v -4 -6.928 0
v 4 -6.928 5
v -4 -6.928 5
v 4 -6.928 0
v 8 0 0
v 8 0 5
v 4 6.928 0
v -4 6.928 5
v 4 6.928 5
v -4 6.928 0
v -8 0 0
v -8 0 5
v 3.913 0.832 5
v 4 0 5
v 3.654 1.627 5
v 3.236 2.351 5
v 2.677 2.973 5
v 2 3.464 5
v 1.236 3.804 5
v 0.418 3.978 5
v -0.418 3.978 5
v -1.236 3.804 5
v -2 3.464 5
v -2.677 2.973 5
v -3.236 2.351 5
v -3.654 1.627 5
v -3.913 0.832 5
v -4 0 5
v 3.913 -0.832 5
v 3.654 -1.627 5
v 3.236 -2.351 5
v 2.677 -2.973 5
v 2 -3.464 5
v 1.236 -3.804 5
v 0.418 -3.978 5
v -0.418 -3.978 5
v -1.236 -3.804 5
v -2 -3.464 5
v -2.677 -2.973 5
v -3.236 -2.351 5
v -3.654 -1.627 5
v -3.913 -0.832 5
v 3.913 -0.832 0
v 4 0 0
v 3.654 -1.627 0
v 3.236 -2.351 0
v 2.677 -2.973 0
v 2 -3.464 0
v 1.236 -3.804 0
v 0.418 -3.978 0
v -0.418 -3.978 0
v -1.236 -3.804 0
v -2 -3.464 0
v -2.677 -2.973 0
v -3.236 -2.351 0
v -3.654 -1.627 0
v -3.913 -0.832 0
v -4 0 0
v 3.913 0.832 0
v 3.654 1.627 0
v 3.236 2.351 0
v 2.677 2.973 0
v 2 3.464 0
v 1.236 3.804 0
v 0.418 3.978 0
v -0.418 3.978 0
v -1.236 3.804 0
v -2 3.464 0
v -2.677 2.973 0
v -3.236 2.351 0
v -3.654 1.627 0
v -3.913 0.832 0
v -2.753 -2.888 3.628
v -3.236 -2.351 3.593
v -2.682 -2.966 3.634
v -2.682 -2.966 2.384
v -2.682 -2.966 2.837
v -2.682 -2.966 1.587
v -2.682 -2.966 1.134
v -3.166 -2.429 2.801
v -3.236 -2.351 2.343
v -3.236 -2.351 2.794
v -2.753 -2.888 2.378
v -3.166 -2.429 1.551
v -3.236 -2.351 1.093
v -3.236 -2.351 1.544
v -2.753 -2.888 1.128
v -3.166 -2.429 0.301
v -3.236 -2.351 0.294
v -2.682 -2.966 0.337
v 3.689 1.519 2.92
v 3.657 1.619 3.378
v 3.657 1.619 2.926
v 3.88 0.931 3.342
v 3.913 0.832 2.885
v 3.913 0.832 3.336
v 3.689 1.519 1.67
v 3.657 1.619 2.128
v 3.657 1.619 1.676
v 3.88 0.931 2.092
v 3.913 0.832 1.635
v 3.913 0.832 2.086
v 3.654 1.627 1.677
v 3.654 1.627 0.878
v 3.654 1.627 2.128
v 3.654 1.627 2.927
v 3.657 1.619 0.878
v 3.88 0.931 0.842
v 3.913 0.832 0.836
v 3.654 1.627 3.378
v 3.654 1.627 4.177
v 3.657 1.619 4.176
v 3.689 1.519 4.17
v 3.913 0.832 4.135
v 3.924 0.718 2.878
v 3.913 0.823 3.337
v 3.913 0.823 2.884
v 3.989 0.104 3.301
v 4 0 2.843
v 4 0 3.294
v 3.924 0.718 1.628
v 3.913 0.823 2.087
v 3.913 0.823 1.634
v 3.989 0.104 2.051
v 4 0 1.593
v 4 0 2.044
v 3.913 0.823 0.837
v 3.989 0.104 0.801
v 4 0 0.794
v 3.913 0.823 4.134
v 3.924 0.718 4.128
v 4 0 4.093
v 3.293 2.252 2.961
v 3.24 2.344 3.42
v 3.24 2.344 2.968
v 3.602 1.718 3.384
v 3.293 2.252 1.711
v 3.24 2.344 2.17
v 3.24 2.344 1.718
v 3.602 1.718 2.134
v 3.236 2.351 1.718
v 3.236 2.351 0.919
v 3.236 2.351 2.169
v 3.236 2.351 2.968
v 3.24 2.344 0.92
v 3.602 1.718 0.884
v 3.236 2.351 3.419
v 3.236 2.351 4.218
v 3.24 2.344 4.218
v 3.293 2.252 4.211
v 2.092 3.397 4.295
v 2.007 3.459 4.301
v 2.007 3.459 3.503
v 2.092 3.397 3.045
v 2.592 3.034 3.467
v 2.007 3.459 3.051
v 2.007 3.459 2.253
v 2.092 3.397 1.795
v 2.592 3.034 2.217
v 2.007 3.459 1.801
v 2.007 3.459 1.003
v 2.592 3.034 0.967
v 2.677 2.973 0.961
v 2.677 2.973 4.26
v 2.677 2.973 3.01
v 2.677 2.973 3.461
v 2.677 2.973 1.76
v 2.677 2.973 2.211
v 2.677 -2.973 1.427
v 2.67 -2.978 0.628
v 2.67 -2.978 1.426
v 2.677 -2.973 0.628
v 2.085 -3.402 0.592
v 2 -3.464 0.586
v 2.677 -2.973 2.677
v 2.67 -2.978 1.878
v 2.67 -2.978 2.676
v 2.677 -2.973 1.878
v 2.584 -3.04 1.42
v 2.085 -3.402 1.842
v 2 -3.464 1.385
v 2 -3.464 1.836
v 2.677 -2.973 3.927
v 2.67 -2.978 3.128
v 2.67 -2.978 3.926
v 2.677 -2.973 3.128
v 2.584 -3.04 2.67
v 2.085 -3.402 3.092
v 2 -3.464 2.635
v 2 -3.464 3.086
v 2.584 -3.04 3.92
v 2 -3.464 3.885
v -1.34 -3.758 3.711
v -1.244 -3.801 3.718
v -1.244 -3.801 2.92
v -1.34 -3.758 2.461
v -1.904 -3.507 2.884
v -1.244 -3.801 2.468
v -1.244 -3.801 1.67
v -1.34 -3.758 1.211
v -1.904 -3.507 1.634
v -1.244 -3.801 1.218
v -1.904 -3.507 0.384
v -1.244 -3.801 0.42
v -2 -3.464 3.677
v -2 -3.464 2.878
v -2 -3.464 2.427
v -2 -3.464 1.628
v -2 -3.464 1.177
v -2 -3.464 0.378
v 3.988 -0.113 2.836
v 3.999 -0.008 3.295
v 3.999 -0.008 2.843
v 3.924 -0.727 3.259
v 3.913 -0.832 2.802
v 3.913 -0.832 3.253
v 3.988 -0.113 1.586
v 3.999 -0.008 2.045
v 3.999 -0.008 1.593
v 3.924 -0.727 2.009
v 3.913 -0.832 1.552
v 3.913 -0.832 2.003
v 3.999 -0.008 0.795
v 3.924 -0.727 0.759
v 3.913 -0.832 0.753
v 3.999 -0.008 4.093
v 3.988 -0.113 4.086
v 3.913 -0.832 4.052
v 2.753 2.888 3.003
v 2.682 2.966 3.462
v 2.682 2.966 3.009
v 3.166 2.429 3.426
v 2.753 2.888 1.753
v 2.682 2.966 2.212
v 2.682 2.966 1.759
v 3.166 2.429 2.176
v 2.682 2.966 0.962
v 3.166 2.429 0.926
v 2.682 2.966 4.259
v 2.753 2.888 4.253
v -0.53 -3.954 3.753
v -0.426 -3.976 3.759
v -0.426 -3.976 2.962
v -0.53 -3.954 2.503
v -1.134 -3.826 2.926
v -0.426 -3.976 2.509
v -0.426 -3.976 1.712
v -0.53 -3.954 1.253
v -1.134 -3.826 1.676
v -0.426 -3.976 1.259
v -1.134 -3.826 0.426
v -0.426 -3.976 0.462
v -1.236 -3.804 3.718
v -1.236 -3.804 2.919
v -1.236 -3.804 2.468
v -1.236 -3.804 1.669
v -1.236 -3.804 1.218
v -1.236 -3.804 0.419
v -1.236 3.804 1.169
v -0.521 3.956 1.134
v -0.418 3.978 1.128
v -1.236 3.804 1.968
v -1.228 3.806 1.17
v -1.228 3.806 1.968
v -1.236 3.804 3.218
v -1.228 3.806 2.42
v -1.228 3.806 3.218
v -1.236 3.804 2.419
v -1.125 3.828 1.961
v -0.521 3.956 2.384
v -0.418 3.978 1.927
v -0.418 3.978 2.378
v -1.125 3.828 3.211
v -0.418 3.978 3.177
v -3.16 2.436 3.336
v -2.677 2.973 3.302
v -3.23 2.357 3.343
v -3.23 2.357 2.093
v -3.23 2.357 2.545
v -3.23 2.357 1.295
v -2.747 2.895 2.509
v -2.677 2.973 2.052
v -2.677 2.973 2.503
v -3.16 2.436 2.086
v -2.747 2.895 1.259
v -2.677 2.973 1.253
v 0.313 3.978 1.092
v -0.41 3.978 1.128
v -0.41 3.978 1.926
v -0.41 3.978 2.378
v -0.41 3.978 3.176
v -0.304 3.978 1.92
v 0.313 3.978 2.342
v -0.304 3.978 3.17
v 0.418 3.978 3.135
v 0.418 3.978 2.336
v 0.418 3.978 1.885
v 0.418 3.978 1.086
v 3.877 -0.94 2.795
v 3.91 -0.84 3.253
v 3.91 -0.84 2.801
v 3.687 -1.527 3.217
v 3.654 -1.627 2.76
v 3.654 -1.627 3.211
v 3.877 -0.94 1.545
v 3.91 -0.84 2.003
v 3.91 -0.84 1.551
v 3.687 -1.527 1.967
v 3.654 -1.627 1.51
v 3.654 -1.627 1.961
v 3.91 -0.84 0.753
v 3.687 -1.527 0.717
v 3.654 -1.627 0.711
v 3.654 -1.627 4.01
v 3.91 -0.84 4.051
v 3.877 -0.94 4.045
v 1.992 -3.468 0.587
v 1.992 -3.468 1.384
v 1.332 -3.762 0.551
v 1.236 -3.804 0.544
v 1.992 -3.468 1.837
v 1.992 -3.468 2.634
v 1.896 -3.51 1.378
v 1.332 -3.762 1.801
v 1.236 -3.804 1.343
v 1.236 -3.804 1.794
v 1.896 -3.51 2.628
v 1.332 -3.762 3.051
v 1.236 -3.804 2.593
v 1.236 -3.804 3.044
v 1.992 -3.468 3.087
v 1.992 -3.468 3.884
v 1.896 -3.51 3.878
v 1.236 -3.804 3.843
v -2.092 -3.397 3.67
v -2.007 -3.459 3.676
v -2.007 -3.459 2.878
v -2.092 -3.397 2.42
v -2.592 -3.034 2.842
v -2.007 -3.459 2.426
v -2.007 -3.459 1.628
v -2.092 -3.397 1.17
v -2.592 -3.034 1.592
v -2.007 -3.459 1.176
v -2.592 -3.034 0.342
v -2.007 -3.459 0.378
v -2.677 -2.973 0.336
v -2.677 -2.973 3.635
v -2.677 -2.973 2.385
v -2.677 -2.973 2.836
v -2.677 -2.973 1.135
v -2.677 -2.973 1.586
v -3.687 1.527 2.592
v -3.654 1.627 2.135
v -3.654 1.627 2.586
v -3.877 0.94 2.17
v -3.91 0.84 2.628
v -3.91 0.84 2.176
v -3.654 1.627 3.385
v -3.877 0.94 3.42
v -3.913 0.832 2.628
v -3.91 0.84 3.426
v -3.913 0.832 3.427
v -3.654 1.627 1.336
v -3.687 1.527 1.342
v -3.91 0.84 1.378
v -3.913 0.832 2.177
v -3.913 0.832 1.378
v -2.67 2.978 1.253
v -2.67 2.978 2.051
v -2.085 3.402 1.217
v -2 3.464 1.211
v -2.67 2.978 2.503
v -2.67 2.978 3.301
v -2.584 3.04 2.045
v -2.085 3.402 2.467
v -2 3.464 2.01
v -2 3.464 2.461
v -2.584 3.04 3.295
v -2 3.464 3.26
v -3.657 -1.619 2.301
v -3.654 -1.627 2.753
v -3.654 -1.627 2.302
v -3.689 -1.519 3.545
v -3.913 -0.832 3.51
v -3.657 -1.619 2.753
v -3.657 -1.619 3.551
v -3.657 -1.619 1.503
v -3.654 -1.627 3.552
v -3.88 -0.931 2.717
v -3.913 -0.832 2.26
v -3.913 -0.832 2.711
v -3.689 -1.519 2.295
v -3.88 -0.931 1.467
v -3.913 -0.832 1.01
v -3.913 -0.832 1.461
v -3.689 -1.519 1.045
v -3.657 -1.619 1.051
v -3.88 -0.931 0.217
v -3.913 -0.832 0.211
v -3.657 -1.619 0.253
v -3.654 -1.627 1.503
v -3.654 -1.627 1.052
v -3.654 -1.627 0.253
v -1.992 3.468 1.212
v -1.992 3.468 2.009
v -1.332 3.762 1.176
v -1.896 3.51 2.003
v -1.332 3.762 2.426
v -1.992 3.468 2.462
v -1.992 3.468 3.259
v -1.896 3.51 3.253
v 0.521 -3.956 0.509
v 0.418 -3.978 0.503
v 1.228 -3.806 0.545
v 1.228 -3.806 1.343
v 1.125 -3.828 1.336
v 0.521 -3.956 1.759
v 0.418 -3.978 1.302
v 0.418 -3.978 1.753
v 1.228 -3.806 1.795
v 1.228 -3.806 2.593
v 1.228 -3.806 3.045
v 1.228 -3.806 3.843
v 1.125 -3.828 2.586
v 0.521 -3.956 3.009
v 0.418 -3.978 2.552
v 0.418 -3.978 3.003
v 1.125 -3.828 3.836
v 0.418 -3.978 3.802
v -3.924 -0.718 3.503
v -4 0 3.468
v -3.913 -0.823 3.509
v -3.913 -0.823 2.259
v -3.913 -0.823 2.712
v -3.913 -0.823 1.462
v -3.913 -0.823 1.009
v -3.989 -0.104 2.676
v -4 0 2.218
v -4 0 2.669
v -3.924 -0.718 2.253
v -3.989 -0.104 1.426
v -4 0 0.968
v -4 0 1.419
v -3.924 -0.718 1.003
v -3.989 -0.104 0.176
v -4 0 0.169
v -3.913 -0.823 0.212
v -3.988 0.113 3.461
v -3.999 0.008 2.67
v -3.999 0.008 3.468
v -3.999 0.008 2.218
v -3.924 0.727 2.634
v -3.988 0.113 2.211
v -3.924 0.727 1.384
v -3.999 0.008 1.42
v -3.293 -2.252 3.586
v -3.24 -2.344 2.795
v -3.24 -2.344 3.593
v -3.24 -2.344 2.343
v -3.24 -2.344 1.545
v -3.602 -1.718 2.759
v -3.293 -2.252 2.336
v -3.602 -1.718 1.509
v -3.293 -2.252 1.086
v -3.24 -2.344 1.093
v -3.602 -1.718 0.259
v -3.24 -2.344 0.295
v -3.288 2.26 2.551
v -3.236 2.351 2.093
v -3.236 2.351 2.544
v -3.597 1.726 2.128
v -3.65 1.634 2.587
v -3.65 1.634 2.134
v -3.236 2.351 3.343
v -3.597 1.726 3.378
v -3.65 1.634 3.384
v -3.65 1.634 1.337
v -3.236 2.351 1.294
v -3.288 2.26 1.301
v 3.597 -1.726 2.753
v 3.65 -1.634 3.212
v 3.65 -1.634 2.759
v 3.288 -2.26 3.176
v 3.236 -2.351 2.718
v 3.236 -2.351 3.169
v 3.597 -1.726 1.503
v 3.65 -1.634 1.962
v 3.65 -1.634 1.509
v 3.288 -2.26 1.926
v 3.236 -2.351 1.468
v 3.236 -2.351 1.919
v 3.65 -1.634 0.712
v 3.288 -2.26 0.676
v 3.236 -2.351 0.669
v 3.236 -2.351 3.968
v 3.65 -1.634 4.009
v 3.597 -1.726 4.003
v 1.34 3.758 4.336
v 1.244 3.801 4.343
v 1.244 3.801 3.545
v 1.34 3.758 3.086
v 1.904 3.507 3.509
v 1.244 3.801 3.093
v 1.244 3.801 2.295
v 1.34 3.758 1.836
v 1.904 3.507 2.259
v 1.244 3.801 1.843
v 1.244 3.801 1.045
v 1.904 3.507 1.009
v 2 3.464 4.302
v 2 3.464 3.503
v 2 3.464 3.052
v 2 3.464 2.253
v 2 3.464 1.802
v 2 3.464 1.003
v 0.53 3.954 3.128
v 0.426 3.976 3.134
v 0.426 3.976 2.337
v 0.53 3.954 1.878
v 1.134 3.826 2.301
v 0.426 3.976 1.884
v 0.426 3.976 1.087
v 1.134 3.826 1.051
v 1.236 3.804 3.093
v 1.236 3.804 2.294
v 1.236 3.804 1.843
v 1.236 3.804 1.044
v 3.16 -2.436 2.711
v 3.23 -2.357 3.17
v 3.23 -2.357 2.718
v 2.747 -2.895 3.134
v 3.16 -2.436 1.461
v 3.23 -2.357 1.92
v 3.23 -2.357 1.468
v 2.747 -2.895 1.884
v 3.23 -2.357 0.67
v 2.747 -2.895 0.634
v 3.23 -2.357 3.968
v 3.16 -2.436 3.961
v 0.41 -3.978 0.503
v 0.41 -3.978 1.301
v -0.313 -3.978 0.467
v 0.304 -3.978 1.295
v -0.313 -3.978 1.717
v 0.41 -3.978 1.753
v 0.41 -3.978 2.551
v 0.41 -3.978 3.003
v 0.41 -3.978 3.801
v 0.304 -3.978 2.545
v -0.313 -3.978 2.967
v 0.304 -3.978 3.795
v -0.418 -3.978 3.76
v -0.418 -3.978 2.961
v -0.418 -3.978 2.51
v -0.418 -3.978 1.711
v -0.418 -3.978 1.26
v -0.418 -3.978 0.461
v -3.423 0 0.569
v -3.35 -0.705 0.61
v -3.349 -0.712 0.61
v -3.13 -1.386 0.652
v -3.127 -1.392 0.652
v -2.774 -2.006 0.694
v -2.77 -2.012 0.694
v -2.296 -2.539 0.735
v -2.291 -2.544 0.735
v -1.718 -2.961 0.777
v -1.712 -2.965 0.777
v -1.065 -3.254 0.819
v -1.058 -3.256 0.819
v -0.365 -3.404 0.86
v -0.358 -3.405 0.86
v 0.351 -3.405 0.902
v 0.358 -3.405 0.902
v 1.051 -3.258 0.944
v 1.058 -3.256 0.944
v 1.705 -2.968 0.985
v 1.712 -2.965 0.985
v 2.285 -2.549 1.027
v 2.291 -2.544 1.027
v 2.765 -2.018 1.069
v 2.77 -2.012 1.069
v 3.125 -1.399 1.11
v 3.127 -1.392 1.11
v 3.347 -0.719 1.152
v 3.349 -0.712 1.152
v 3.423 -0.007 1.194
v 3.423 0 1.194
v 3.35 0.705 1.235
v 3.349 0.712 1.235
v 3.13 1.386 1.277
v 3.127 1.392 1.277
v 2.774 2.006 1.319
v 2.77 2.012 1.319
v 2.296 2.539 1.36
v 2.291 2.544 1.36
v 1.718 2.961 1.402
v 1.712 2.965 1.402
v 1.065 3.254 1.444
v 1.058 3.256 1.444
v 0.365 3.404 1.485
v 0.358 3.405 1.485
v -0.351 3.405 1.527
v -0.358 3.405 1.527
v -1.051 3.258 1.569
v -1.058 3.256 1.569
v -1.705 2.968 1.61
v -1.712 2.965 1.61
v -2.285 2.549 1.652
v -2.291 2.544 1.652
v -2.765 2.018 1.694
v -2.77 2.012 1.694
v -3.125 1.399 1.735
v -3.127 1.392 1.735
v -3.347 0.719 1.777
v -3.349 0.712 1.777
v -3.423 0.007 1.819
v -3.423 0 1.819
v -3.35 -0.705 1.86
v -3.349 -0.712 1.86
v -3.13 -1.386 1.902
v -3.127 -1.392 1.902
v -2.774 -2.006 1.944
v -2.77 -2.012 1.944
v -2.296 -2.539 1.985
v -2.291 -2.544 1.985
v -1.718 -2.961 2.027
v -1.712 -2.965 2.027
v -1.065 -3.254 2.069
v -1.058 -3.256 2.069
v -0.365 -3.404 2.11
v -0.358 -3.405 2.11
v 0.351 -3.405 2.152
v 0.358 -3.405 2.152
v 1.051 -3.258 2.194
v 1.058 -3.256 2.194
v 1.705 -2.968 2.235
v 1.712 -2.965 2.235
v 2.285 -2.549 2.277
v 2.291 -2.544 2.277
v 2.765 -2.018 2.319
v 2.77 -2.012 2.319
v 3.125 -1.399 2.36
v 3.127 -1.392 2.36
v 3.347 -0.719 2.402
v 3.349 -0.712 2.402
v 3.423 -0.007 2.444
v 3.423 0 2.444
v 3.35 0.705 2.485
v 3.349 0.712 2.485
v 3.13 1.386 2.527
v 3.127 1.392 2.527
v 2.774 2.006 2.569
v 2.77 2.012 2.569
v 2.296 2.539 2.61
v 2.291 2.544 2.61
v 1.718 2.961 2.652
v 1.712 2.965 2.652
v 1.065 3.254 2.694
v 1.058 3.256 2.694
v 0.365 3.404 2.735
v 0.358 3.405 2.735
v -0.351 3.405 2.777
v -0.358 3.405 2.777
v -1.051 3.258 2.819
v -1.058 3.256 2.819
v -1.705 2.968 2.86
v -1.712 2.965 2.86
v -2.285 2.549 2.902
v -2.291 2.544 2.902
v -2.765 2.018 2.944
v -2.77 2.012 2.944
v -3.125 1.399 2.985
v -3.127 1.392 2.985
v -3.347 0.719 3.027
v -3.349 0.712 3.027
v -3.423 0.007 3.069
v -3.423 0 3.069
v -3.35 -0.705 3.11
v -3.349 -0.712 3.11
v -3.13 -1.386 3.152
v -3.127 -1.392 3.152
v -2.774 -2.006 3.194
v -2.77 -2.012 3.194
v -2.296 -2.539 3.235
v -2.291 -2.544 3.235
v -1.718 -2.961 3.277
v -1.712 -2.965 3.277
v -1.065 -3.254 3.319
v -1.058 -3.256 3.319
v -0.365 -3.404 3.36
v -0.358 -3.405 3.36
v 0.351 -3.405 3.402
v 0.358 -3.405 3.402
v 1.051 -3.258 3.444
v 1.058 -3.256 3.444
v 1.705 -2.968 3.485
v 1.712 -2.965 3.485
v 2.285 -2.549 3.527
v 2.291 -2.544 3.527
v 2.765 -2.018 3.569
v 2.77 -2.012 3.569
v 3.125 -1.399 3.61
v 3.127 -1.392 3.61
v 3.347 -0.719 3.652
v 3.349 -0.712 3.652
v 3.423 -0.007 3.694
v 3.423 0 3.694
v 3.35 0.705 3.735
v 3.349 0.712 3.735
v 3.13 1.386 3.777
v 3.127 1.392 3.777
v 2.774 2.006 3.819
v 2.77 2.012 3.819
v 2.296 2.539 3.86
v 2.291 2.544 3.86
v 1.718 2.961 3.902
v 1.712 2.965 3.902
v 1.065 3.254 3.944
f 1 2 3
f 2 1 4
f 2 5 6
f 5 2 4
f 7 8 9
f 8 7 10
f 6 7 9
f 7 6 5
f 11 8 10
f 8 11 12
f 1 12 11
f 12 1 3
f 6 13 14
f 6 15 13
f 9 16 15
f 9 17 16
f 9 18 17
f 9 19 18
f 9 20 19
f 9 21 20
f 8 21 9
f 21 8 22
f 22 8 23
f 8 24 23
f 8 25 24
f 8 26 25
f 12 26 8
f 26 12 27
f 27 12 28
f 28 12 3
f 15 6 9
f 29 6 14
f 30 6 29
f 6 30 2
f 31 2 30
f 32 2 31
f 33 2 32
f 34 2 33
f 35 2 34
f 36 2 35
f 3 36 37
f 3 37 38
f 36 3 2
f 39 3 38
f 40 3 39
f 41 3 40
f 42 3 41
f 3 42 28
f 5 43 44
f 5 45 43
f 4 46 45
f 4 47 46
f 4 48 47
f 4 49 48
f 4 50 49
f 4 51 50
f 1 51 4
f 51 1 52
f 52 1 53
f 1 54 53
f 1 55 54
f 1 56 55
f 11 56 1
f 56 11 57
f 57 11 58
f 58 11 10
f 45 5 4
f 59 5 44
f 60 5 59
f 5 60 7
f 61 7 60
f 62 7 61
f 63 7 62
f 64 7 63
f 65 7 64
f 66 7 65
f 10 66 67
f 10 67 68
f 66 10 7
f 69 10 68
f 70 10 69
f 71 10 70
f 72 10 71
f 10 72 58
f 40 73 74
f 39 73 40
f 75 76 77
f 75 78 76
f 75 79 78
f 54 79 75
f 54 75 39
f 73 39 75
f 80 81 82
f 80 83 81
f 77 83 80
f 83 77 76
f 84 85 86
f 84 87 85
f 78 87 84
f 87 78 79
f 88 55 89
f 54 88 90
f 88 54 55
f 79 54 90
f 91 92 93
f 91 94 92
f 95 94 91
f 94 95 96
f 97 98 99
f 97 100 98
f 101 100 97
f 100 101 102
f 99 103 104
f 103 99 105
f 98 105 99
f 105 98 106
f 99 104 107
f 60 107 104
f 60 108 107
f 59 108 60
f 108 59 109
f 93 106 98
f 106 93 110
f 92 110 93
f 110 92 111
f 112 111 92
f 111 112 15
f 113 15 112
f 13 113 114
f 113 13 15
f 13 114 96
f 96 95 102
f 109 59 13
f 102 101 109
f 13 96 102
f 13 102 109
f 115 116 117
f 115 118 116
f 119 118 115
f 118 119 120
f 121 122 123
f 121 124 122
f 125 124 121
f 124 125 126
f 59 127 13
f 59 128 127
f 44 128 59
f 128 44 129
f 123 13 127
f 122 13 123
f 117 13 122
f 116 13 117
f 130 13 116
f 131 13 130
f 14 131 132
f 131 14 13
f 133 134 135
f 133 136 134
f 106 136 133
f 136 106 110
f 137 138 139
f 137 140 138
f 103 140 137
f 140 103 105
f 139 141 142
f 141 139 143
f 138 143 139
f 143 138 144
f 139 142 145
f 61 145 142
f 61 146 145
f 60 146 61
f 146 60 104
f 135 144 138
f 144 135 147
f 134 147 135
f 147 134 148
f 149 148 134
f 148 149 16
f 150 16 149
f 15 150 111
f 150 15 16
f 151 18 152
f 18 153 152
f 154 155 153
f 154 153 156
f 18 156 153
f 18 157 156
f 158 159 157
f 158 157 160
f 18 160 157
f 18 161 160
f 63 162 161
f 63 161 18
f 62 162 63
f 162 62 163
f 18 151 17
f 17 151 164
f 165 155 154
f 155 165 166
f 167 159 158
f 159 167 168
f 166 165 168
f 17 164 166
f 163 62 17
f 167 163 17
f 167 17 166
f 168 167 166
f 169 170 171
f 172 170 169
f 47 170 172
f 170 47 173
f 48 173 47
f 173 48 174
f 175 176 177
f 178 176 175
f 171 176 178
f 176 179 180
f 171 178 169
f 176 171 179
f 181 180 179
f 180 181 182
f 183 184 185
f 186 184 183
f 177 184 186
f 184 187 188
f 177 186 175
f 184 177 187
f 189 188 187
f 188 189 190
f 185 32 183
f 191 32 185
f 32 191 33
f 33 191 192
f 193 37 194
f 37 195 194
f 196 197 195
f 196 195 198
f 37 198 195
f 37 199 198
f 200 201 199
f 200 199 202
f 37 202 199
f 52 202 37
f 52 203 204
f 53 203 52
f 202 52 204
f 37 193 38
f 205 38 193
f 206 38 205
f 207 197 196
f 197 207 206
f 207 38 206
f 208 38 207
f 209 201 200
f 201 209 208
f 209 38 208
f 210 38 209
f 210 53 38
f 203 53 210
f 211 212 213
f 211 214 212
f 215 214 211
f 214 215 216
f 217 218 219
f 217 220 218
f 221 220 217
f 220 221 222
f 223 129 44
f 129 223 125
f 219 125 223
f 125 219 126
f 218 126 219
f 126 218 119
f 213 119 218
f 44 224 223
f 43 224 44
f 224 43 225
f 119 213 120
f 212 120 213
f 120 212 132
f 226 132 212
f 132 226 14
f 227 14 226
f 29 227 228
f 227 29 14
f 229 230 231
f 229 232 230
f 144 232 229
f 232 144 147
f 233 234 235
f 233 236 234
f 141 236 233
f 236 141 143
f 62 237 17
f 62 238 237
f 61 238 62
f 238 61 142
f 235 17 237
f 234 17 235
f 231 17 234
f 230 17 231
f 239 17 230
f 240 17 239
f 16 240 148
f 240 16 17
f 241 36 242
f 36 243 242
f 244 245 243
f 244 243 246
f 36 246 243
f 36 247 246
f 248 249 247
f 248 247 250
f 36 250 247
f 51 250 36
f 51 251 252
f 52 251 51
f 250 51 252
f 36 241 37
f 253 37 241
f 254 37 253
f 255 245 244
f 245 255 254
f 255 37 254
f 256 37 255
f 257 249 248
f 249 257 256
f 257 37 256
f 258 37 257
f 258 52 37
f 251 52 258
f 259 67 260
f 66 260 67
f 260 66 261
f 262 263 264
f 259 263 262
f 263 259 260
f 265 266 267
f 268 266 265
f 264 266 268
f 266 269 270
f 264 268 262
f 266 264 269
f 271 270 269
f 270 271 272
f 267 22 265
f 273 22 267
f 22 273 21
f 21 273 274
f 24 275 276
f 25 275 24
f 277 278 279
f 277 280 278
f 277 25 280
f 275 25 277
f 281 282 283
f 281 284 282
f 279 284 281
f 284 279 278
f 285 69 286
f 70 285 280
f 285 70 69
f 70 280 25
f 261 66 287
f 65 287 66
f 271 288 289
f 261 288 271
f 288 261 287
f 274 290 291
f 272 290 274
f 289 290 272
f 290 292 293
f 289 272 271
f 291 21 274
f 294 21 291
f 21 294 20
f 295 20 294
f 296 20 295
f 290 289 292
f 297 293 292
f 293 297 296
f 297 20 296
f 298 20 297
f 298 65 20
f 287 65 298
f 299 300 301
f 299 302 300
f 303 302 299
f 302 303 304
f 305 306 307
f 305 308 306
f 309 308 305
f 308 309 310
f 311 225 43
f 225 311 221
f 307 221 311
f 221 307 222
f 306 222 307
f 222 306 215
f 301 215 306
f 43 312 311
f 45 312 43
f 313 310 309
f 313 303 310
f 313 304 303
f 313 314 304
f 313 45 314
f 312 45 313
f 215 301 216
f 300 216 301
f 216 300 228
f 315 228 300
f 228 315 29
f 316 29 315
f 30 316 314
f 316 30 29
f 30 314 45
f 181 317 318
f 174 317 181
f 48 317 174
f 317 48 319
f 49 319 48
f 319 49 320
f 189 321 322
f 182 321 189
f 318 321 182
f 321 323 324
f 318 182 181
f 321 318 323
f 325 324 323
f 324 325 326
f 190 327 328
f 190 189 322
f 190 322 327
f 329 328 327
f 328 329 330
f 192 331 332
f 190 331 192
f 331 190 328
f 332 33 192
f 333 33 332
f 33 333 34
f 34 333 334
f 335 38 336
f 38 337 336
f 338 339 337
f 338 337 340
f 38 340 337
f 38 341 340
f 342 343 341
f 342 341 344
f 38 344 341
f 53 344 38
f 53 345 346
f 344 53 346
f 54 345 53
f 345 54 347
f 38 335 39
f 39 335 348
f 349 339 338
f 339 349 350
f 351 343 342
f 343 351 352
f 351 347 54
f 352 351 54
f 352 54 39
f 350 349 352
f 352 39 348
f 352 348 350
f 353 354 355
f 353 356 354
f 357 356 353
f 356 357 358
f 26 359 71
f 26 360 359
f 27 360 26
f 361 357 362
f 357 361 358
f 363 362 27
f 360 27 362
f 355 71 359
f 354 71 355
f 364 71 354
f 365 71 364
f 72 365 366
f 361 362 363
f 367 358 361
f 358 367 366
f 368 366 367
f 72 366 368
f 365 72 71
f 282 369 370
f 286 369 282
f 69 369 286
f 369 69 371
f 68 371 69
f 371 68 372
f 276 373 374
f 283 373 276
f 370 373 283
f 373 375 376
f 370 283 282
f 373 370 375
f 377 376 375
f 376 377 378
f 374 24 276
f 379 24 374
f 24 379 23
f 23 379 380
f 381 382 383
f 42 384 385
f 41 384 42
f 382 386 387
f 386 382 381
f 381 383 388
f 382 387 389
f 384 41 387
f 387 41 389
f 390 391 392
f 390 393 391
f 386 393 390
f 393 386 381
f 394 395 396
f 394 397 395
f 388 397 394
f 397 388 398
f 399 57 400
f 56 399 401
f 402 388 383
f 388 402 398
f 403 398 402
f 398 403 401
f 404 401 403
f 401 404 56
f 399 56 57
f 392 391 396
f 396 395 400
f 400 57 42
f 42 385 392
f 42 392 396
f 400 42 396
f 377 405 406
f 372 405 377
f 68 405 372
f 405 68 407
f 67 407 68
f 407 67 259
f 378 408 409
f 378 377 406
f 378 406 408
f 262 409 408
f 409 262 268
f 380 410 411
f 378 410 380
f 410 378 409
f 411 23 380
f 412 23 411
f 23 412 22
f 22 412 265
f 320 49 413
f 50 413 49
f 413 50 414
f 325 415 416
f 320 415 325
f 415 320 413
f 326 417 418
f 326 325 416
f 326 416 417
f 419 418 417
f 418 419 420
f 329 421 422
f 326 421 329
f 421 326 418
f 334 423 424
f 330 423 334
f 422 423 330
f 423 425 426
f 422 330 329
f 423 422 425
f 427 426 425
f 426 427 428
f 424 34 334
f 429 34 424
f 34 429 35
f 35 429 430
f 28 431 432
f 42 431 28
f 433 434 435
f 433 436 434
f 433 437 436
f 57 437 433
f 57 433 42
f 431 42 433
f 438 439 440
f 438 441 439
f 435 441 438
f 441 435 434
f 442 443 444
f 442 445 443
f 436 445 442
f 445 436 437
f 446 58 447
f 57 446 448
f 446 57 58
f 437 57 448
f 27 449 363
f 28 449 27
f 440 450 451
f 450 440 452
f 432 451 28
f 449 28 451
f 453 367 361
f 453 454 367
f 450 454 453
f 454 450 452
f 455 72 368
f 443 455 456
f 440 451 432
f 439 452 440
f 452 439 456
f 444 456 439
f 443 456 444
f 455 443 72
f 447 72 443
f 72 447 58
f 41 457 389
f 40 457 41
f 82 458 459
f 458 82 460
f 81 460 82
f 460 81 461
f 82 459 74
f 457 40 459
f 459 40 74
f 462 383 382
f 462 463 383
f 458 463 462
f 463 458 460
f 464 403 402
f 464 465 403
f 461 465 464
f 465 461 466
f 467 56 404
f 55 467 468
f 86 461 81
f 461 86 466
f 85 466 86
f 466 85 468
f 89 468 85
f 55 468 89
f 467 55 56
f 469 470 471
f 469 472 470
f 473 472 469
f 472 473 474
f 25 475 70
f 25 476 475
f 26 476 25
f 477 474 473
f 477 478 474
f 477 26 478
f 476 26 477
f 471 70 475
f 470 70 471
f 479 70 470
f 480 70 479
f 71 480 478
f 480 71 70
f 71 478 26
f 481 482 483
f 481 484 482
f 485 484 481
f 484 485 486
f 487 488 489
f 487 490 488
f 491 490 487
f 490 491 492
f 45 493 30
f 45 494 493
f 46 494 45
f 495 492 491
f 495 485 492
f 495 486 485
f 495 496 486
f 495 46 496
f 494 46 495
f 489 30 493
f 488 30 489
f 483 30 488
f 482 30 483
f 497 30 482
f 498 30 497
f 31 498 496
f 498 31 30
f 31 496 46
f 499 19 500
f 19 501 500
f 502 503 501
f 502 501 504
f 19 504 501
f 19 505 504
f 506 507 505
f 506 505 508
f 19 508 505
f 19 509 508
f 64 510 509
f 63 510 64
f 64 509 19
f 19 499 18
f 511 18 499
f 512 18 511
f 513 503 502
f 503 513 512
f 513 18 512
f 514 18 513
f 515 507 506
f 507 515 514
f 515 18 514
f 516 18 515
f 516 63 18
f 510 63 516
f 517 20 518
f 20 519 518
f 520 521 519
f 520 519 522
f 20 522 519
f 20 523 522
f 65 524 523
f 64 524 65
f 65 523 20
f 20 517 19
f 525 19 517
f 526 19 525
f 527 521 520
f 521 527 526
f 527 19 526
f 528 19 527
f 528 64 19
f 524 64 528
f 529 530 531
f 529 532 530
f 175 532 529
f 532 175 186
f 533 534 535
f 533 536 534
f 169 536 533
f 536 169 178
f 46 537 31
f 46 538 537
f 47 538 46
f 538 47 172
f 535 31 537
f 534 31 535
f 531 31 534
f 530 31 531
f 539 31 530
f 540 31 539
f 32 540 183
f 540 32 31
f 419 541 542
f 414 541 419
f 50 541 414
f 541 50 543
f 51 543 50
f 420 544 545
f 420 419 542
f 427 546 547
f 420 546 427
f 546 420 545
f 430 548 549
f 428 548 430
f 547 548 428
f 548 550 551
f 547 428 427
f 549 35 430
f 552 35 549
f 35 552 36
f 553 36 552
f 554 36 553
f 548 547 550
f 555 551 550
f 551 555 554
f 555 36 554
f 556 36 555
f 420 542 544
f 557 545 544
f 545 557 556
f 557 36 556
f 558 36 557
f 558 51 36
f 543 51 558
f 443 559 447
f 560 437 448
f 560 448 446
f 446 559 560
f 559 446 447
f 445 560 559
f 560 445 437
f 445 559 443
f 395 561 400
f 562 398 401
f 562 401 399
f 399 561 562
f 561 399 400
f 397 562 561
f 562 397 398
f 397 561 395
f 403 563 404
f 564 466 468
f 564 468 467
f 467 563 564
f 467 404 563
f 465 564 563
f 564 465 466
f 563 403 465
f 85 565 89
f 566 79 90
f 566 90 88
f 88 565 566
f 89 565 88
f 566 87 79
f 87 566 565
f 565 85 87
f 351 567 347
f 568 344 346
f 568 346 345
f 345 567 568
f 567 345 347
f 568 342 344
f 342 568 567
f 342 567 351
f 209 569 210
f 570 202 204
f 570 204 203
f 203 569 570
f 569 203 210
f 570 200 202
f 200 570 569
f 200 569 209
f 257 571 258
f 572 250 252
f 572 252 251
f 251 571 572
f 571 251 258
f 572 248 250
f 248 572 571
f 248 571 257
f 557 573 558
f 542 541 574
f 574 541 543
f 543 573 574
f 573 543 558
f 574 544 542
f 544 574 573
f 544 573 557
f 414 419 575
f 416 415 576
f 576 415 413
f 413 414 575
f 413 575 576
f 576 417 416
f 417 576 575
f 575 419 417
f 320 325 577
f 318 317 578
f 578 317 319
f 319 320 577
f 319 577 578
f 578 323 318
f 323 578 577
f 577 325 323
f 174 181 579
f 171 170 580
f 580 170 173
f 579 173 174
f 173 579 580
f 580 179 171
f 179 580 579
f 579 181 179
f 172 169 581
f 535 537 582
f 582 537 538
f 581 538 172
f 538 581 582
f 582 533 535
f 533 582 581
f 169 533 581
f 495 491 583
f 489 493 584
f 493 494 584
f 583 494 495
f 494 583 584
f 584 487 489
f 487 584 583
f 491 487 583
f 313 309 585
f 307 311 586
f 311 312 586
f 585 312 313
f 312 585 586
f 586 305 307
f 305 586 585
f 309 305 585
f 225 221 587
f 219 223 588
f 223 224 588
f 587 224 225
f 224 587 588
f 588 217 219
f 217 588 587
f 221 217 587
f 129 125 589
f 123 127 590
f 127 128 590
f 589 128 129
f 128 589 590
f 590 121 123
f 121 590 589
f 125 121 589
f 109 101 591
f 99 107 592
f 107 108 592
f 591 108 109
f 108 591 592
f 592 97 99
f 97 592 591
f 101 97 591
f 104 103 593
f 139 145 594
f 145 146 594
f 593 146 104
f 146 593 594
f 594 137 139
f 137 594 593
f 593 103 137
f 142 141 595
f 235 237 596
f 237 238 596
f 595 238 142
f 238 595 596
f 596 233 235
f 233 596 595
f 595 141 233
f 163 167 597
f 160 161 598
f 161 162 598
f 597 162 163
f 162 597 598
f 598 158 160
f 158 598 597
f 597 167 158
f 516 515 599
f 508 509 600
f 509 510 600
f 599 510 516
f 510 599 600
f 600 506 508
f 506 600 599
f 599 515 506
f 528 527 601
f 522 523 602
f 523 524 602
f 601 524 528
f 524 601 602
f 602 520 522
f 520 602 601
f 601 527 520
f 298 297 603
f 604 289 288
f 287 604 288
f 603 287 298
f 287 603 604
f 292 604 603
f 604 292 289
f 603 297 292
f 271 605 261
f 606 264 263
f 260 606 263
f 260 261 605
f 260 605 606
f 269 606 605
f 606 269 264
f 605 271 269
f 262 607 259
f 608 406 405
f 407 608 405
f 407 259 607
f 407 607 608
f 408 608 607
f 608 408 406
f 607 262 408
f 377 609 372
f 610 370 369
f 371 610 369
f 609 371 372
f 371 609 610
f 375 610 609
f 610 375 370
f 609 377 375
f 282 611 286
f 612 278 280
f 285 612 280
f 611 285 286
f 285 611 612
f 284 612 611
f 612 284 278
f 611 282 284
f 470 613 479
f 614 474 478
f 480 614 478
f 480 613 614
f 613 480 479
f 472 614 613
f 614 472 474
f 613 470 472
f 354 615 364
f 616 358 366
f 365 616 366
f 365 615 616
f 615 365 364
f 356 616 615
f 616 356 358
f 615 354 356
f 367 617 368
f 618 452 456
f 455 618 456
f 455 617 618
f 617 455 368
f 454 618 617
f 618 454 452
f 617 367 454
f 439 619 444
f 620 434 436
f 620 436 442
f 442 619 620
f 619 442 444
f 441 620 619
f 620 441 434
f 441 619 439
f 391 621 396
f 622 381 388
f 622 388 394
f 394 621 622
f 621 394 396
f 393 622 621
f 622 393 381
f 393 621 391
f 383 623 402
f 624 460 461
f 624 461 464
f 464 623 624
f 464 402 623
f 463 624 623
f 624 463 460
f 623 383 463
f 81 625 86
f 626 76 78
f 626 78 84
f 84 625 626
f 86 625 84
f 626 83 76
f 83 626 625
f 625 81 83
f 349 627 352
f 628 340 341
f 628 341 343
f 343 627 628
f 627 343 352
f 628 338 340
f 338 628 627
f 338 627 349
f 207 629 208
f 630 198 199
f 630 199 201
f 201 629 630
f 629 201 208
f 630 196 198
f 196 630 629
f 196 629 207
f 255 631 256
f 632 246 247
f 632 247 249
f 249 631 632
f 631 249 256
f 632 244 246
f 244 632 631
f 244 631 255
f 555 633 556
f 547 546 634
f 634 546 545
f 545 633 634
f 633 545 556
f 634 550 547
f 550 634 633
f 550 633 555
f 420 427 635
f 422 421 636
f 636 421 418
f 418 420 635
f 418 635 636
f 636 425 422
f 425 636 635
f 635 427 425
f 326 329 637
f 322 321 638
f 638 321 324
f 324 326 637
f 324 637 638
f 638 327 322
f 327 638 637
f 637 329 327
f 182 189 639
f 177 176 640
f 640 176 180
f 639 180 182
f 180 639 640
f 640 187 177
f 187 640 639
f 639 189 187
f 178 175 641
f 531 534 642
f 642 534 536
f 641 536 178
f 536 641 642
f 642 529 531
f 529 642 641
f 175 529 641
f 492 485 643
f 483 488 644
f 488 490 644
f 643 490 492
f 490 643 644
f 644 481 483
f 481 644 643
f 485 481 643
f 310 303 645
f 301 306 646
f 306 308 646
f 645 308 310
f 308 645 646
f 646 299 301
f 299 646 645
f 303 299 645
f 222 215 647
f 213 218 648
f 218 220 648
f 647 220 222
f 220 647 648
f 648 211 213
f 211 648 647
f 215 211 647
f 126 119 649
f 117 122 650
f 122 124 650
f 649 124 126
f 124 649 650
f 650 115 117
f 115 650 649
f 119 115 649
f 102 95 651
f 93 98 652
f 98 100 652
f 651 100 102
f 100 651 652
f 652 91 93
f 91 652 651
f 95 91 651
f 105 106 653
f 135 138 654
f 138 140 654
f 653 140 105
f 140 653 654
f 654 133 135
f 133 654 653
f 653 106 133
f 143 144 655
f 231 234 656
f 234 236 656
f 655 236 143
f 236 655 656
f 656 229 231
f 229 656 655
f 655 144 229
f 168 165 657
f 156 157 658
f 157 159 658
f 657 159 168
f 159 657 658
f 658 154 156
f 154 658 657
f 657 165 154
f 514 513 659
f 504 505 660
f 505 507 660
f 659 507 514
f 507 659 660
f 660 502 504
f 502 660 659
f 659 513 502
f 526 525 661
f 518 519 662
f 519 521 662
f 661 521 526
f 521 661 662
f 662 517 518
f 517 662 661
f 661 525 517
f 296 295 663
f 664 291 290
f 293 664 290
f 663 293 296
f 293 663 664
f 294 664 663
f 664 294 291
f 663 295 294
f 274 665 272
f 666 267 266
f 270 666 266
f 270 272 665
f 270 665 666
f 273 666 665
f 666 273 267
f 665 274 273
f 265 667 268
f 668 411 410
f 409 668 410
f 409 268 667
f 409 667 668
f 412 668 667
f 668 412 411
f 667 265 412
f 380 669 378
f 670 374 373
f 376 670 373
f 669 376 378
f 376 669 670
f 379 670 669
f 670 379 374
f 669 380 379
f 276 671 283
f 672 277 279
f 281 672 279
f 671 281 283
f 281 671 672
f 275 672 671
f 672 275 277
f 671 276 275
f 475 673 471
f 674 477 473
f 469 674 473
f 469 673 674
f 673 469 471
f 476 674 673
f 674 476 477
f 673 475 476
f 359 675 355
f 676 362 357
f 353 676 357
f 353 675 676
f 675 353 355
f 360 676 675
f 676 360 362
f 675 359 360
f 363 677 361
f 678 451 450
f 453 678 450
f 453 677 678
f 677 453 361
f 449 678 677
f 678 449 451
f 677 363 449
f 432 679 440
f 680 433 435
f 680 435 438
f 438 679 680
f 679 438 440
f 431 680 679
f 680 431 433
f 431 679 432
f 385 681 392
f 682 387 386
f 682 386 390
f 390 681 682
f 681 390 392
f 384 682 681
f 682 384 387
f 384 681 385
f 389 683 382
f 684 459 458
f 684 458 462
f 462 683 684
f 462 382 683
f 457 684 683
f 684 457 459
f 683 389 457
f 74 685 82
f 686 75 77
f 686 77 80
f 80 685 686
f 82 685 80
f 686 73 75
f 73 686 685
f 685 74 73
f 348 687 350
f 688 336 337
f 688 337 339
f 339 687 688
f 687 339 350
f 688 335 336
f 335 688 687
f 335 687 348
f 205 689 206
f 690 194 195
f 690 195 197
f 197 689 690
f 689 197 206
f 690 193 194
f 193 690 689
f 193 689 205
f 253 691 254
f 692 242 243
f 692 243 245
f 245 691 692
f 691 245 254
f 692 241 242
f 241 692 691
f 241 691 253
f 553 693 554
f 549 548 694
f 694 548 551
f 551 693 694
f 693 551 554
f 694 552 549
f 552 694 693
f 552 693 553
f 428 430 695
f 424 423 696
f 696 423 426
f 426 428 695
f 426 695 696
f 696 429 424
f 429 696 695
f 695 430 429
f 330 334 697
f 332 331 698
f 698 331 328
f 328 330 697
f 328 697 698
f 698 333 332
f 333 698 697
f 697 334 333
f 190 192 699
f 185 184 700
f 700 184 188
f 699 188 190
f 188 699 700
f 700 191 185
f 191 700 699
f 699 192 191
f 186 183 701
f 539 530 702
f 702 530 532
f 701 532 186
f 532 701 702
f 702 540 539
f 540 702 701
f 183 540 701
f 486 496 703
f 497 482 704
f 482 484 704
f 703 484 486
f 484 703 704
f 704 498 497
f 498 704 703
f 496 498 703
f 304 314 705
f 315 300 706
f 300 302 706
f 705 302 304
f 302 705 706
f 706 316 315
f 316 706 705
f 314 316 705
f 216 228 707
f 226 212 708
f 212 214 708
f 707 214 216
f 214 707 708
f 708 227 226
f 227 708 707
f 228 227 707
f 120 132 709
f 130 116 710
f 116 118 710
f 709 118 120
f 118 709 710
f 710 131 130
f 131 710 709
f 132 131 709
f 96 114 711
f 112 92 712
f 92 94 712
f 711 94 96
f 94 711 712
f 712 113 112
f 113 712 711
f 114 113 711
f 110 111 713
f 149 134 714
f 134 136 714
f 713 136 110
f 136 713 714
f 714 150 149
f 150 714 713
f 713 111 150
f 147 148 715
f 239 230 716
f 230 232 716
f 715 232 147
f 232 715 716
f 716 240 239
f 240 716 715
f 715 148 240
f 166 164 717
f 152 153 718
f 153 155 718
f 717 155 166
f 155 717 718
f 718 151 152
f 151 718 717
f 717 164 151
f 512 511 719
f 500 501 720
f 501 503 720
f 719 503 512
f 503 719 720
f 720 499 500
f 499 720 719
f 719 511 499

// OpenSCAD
// ISO Metric Thread Implementation
// Trevor Moseley
// 26/04/2014

// For thread dimensions see
//   http://en.wikipedia.org/wiki/File:ISO_and_UTS_Thread_Dimensions.svg

/* [Global] */

// What quality?
$fn = 30;	// [20,30,40,50,60,70,80,90,100]

// What Wrench (Spanner) sizes?
WrenchSizes = 0;	// [0:Rolson sizes,1:Fairbury sizes]

// Nuts or Bolts?
Type = 0;	// [0:Nuts,1:Bolts]

// What size of metric thread?
Thread = 8;	//[5:100]

// What length of thread (mm)?
Length = 16;	//[5:100]

// How many accross (y)?
Accros = 1;	// [1:20]

// How many down (x)?
Down = 1;	// [1:20]

// Spacing between centres?
Space = 17;	// [5:200]

do_it();

module do_it()
{
	for (ac=[1:Accros])
	{
		for (dn=[1:Down])
		{
			translate([
				-(((Accros-1)*Space)/2)+((ac-1)*Space),
				-(((Down-1)*Space)/2)+((dn-1)*Space),
				0])
			{
				if (Type==0)
					hex_nut(Thread);
				else
					hex_bolt(Thread,Length);
			}
		}
	}
}

//--demo functions--------------------------------------------------------------

//hex_bolt(10,16);						// make an M10 x 16 ISO bolt
//hex_nut(10);							// make an M10 ISO nut
//hex_bolt(8,16);						// make an M8 x 16 ISO bolt
//hex_nut(8);							// make an M8 ISO nut
//hex_bolt(6,12);						// make an M6 x 12 ISO bolt
//hex_nut(6);							// make an M6 ISO nut
//thread_out(8,16);					// make an M8 x 16 ISO thread
//thread_out_centre(8,16);				// make a centre for an M8 x 16 ISO thread
//thread_out_pitch(8,16,1.0);			// make an M8 x 16 thread with 1 mm pitch
//thread_out_centre_pitch(8,16,0.5);	// make the centre for an M8 x 16 thread with 1 mm pitch
//thread_in(8,10);						// make an M8 x 10 ISO thread
//thread_in_ring(8,10,2);				// make a ring to enclose an M8 x 10 ISO thread with thickness 2 mm
//thread_in_pitch(8,10,1.0);			// make an M8 x 10 thread with 1mm pitch

//--pitch-----------------------------------------------------------------------
// function for ISO coarse thread pitch (these are specified by ISO)
function get_coarse_pitch(dia) = lookup(dia, [
[1,0.25],[1.2,0.25],[1.4,0.3],[1.6,0.35],[1.8,0.35],[2,0.4],[2.5,0.45],[3,0.5],[3.5,0.6],[4,0.7],[5,0.8],[6,1],[7,1],[8,1.25],[10,1.5],[12,1.75],[14,2],[16,2],[18,2.5],[20,2.5],[22,2.5],[24,3],[27,3],[30,3.5],[33,3.5],[36,4],[39,4],[42,4.5],[45,4.5],[48,5],[52,5],[56,5.5],[60,5.5],[64,6],[78,5]]);

//--nut dims--------------------------------------------------------------------
// these are NOT specified by ISO
// support is provided for Rolson or Fairbury sizes, see WrenchSizes above

// function for Rolson hex nut diameter from thread size
function rolson_hex_nut_dia(dia) = lookup(dia, [
[3,6.4],[4,8.1],[5,9.2],[6,11.5],[8,16.0],[10,19.6],[12,22.1],[16,27.7],[20,34.6],[24,41.6],[30,53.1],[36,63.5]]);
// function for Rolson hex nut height from thread size
function rolson_hex_nut_hi(dia) = lookup(dia, [
[3,2.4],[4,3.2],[5,4],[6,3],[8,5],[10,5],[12,10],[16,13],[20,16],[24,19],[30,24],[36,29]]);

// function for Fairbury hex nut diameter from thread size
function fairbury_hex_nut_dia(dia) = lookup(dia, [
[3,6.0],[4,7.7],[5,8.8],[6,11.0],[8,14.4],[10,17.8],[12,20.0],[16,26.8],[20,33.0],[24,40.0],[30,50.9],[36,60.8]]);
// function for Fairbury hex nut height from thread size
function fairbury_hex_nut_hi(dia) = lookup(dia, [
[3,2.2],[4,3.0],[5,4.5],[6,5.0],[8,6.5],[10,8.1],[12,10.4],[16,14.2],[20,17],[24,20.3],[30,24.4],[36,29.5]]);

//--bolt dims-------------------------------------------------------------------
// these are NOT specified by ISO
// support is provided for Rolson or Fairbury sizes, see WrenchSizes above

// function for Rolson hex bolt head diameter from thread size
function rolson_hex_bolt_dia(dia) = lookup(dia, [
[3,6.4],[4,8.1],[5,9.2],[6,11.5],[8,14.0],[10,16],[12,22.1],[16,27.7],[20,34.6],[24,41.6],[30,53.1],[36,63.5]]);
// function for Rolson hex bolt head height from thread size
function rolson_hex_bolt_hi(dia) = lookup(dia, [
[3,2.4],[4,3.2],[5,4],[6,3.5],[8,4.5],[10,5],[12,10],[16,13],[20,16],[24,19],[30,24],[36,29]]);

// function for Fairbury hex bolt head diameter from thread size
function fairbury_hex_bolt_dia(dia) = lookup(dia, [
[3,6.4],[4,8.1],[5,8.8],[6,11.1],[8,14.4],[10,17.8],[12,20.1],[16,26.8],[20,33.0],[24,39.6],[30,50.9],[36,60.8]]);
// function for Fairbury hex bolt head height from thread size
function fairbury_hex_bolt_hi(dia) = lookup(dia, [
[3,2.4],[4,3.2],[5,3.4],[6,3.9],[8,5.1],[10,6.2],[12,7.3],[16,9.7],[20,12.2],[24,14.6],[30,17.9],[36,21.7]]);

//--top level modules-----------------------------------------------------------

module hex_bolt(dia,hi)
// make an ISO bolt
//  dia=diameter, 6=M6 etc.
//  hi=length of threaded part of bolt
{
	if (WrenchSizes==0)	rolson_hex_bolt(dia,hi);
	else					fairbury_hex_bolt(dia,hi);
}

module hex_nut(dia,hi)
// make an ISO nut
//  dia=diameter, 6=M6 etc.
{
	if (WrenchSizes==0)	rolson_hex_nut(dia);
	else					fairbury_hex_nut(dia);
}

module thread_out(dia,hi,thr=$fn)
// make an outside ISO thread (as used on a bolt)
//  dia=diameter, 6=M6 etc
//  hi=height, 10=make a 10mm long thread
//  thr=thread quality, 10=make a thread with 10 segments per turn
{
	p = get_coarse_pitch(dia);
	thread_out_pitch(dia,hi,p,thr);
}

module thread_in(dia,hi,thr=$fn)
// make an inside thread (as used on a nut)
//  dia = diameter, 6=M6 etc
//  hi = height, 10=make a 10mm long thread
//  thr = thread quality, 10=make a thread with 10 segments per turn
{
	p = get_coarse_pitch(dia);
	thread_in_pitch(dia,hi,p,thr);
}

module thread_out_pitch(dia,hi,p,thr=$fn)
// make an outside thread (as used on a bolt) with supplied pitch
//  dia=diameter, 6=M6 etc
//  hi=height, 10=make a 10mm long thread
//  p=pitch
//  thr=thread quality, 10=make a thread with 10 segments per turn
{
	h=(cos(30)*p)/8;
	Rmin=(dia/2)-(5*h);	// as wiki Dmin
	s=360/thr;				// length of segment in degrees
	t1=(hi-p)/p;			// number of full turns
	r=t1%1.0;				// length remaining (not full turn)
	t=t1-r;					// integer number of full turns
	n=r/(p/thr);			// number of segments for remainder
	// do full turns
	for(tn=[0:t-1])
		translate([0,0,tn*p])	th_out_turn(dia,p,thr);
	// do remainder
	for(sg=[0:n])
		th_out_pt(Rmin+0.1,p,s,sg+(t*thr),thr,h,p/thr);
}

module thread_in_pitch(dia,hi,p,thr=$fn)
// make an inside thread (as used on a nut)
//  dia = diameter, 6=M6 etc
//  hi = height, 10=make a 10mm long thread
//  p=pitch
//  thr = thread quality, 10=make a thread with 10 segments per turn
{
	h=(cos(30)*p)/8;
	Rmin=(dia/2)-(5*h);	// as wiki Dmin
	s=360/thr;				// length of segment in degrees
	t1=(hi-p)/p;			// number of full turns
	r=t1%1.0;				// length remaining (not full turn)
	t=t1-r;					// integer number of turns
	n=r/(p/thr);			// number of segments for remainder
	for(tn=[0:t-1])
		translate([0,0,tn*p])	th_in_turn(dia,p,thr);
	for(sg=[0:n])
		th_in_pt(Rmin+0.1,p,s,sg+(t*thr),thr,h,p/thr);
}

module thread_out_centre(dia,hi)
{
	p = get_coarse_pitch(dia);
	thread_out_centre_pitch(dia,hi,p);
}

module thread_out_centre_pitch(dia,hi,p)
{
	h = (cos(30)*p)/8;
	Rmin = (dia/2) - (5*h);	// as wiki Dmin
	cylinder(r = Rmin, h = hi);
}

module thread_in_ring(dia,hi,thk)
{
	difference()
	{
		cylinder(r = (dia/2)+0.5,h = hi);
		translate([0,0,-1]) cylinder(r = (dia/2)+0.1, h = hi+thk);
	}
}

//--low level modules-----------------------------------------------------------

module rolson_hex_bolt(dia,hi)
// make an ISO bolt with Rolson wrench sizes
//  dia=diameter, 6=M6 etc.
//  hi=length of threaded part of bolt
{
	hhi = rolson_hex_bolt_hi(dia);
	cylinder(r = rolson_hex_bolt_dia(dia)/2,h = hhi, $fn=6);
	translate([0,0,hhi-0.1])	thread_out(dia,hi+0.1);
	translate([0,0,hhi-0.1])	thread_out_centre(dia,hi+0.1);
}

module fairbury_hex_bolt(dia,hi)
// make an ISO bolt with Fairbury wrench sizes
//  dia=diameter, 6=M6 etc.
//  hi=length of threaded part of bolt
{
	hhi = fairbury_hex_bolt_hi(dia);
	cylinder(r = fairbury_hex_bolt_dia(dia)/2,h = hhi, $fn=6);
	translate([0,0,hhi-0.1])	thread_out(dia,hi+0.1);
	translate([0,0,hhi-0.1])	thread_out_centre(dia,hi+0.1);
}

module rolson_hex_nut(dia)
// make an ISO nut with Rolson wrench sizes
//  dia=diameter, 6=M6 etc.
{
	hi = rolson_hex_nut_hi(dia);
	difference()
	{
		cylinder(r = rolson_hex_nut_dia(dia)/2,h = hi, $fn=6);
		translate([0,0,-0.1])	cylinder(r = dia/2, h =hi + 0.2);
	}
	translate([0,0,0.1])	thread_in(dia,hi-0.2);
}

module fairbury_hex_nut(dia)
// make an ISO nut with Fairbury wrench sizes
//  dia=diameter, 6=M6 etc.
{
	hi = fairbury_hex_nut_hi(dia);
	difference()
	{
		cylinder(r = fairbury_hex_nut_dia(dia)/2,h = hi, $fn=6);
		translate([0,0,-0.1])	cylinder(r = dia/2, h =hi + 0.2);
	}
	translate([0,0,0.1])	thread_in(dia,hi-0.2);
}

module th_out_turn(dia,p,thr=$fn)
// make a single turn of an outside thread
//  dia=diameter, 6=M6 etc
//  p=pitch
//  thr=thread quality, 10=make a thread with 10 segments per turn
{
	h = (cos(30)*p)/8;
	Rmin = (dia/2) - (5*h);	// as wiki Dmin
	s = 360/thr;
	for(sg=[0:thr-1])
		th_out_pt(Rmin+0.1,p,s,sg,thr,h,p/thr);
}

module th_out_pt(rt,p,s,sg,thr,h,sh)
// make a part of an outside thread (single segment)
//  rt = radius of thread (nearest centre)
//  p = pitch
//  s = segment length (degrees)
//  sg = segment number
//  thr = segments in circumference
//  h = ISO h of thread / 8
//  sh = segment height (z)
{
	as = (sg % thr) * s;			// angle to start of seg
	ae = as + s  - (s/100);		// angle to end of seg (with overlap)
	z = sh*sg;
	//pp = p/2;
	//   1,4
	//   |\
	//   | \  2,5
 	//   | / 
	//   |/
	//   0,3
	//  view from front (x & z) extruded in y by sg
	//  
	//echo(str("as=",as,", ae=",ae," z=",z));
	polyhedron(
		points = [
			[cos(as)*rt,sin(as)*rt,z],								// 0
			[cos(as)*rt,sin(as)*rt,z+(3/4*p)],						// 1
			[cos(as)*(rt+(5*h)),sin(as)*(rt+(5*h)),z+(3/8*p)],		// 2
			[cos(ae)*rt,sin(ae)*rt,z+sh],							// 3
			[cos(ae)*rt,sin(ae)*rt,z+(3/4*p)+sh],					// 4
			[cos(ae)*(rt+(5*h)),sin(ae)*(rt+(5*h)),z+sh+(3/8*p)]],	// 5
		triangles = [
			[0,1,2],			// near face
			[3,5,4],			// far face
			[0,3,4],[0,4,1],	// left face
			[0,5,3],[0,2,5],	// bottom face
			[1,4,5],[1,5,2]]);	// top face
}

module th_in_turn(dia,p,thr=$fn)
// make an single turn of an inside thread
//  dia = diameter, 6=M6 etc
//  p=pitch
//  thr = thread quality, 10=make a thread with 10 segments per turn
{
	h = (cos(30)*p)/8;
	Rmin = (dia/2) - (5*h);	// as wiki Dmin
	s = 360/thr;
	for(sg=[0:thr-1])
		th_in_pt(Rmin+0.1,p,s,sg,thr,h,p/thr);
}

module th_in_pt(rt,p,s,sg,thr,h,sh)
// make a part of an inside thread (single segment)
//  rt = radius of thread (nearest centre)
//  p = pitch
//  s = segment length (degrees)
//  sg = segment number
//  thr = segments in circumference
//  h = ISO h of thread / 8
//  sh = segment height (z)
{
	as = ((sg % thr) * s - 180);	// angle to start of seg
	ae = as + s -(s/100);		// angle to end of seg (with overlap)
	z = sh*sg;
	pp = p/2;
	//         2,5
	//          /|
	//     1,4 / | 
 	//         \ |
	//          \|
	//         0,3
	//  view from front (x & z) extruded in y by sg
	//  
	polyhedron(
		points = [
			[cos(as)*(rt+(5*h)),sin(as)*(rt+(5*h)),z],				//0
			[cos(as)*rt,sin(as)*rt,z+(3/8*p)],						//1
			[cos(as)*(rt+(5*h)),sin(as)*(rt+(5*h)),z+(3/4*p)],		//2
			[cos(ae)*(rt+(5*h)),sin(ae)*(rt+(5*h)),z+sh],			//3
			[cos(ae)*rt,sin(ae)*rt,z+(3/8*p)+sh],					//4
			[cos(ae)*(rt+(5*h)),sin(ae)*(rt+(5*h)),z+(3/4*p)+sh]],	//5
		triangles = [
			[0,1,2],			// near face
			[3,5,4],			// far face
			[0,3,4],[0,4,1],	// left face
			[0,5,3],[0,2,5],	// bottom face
			[1,4,5],[1,5,2]]);	// top face
}
